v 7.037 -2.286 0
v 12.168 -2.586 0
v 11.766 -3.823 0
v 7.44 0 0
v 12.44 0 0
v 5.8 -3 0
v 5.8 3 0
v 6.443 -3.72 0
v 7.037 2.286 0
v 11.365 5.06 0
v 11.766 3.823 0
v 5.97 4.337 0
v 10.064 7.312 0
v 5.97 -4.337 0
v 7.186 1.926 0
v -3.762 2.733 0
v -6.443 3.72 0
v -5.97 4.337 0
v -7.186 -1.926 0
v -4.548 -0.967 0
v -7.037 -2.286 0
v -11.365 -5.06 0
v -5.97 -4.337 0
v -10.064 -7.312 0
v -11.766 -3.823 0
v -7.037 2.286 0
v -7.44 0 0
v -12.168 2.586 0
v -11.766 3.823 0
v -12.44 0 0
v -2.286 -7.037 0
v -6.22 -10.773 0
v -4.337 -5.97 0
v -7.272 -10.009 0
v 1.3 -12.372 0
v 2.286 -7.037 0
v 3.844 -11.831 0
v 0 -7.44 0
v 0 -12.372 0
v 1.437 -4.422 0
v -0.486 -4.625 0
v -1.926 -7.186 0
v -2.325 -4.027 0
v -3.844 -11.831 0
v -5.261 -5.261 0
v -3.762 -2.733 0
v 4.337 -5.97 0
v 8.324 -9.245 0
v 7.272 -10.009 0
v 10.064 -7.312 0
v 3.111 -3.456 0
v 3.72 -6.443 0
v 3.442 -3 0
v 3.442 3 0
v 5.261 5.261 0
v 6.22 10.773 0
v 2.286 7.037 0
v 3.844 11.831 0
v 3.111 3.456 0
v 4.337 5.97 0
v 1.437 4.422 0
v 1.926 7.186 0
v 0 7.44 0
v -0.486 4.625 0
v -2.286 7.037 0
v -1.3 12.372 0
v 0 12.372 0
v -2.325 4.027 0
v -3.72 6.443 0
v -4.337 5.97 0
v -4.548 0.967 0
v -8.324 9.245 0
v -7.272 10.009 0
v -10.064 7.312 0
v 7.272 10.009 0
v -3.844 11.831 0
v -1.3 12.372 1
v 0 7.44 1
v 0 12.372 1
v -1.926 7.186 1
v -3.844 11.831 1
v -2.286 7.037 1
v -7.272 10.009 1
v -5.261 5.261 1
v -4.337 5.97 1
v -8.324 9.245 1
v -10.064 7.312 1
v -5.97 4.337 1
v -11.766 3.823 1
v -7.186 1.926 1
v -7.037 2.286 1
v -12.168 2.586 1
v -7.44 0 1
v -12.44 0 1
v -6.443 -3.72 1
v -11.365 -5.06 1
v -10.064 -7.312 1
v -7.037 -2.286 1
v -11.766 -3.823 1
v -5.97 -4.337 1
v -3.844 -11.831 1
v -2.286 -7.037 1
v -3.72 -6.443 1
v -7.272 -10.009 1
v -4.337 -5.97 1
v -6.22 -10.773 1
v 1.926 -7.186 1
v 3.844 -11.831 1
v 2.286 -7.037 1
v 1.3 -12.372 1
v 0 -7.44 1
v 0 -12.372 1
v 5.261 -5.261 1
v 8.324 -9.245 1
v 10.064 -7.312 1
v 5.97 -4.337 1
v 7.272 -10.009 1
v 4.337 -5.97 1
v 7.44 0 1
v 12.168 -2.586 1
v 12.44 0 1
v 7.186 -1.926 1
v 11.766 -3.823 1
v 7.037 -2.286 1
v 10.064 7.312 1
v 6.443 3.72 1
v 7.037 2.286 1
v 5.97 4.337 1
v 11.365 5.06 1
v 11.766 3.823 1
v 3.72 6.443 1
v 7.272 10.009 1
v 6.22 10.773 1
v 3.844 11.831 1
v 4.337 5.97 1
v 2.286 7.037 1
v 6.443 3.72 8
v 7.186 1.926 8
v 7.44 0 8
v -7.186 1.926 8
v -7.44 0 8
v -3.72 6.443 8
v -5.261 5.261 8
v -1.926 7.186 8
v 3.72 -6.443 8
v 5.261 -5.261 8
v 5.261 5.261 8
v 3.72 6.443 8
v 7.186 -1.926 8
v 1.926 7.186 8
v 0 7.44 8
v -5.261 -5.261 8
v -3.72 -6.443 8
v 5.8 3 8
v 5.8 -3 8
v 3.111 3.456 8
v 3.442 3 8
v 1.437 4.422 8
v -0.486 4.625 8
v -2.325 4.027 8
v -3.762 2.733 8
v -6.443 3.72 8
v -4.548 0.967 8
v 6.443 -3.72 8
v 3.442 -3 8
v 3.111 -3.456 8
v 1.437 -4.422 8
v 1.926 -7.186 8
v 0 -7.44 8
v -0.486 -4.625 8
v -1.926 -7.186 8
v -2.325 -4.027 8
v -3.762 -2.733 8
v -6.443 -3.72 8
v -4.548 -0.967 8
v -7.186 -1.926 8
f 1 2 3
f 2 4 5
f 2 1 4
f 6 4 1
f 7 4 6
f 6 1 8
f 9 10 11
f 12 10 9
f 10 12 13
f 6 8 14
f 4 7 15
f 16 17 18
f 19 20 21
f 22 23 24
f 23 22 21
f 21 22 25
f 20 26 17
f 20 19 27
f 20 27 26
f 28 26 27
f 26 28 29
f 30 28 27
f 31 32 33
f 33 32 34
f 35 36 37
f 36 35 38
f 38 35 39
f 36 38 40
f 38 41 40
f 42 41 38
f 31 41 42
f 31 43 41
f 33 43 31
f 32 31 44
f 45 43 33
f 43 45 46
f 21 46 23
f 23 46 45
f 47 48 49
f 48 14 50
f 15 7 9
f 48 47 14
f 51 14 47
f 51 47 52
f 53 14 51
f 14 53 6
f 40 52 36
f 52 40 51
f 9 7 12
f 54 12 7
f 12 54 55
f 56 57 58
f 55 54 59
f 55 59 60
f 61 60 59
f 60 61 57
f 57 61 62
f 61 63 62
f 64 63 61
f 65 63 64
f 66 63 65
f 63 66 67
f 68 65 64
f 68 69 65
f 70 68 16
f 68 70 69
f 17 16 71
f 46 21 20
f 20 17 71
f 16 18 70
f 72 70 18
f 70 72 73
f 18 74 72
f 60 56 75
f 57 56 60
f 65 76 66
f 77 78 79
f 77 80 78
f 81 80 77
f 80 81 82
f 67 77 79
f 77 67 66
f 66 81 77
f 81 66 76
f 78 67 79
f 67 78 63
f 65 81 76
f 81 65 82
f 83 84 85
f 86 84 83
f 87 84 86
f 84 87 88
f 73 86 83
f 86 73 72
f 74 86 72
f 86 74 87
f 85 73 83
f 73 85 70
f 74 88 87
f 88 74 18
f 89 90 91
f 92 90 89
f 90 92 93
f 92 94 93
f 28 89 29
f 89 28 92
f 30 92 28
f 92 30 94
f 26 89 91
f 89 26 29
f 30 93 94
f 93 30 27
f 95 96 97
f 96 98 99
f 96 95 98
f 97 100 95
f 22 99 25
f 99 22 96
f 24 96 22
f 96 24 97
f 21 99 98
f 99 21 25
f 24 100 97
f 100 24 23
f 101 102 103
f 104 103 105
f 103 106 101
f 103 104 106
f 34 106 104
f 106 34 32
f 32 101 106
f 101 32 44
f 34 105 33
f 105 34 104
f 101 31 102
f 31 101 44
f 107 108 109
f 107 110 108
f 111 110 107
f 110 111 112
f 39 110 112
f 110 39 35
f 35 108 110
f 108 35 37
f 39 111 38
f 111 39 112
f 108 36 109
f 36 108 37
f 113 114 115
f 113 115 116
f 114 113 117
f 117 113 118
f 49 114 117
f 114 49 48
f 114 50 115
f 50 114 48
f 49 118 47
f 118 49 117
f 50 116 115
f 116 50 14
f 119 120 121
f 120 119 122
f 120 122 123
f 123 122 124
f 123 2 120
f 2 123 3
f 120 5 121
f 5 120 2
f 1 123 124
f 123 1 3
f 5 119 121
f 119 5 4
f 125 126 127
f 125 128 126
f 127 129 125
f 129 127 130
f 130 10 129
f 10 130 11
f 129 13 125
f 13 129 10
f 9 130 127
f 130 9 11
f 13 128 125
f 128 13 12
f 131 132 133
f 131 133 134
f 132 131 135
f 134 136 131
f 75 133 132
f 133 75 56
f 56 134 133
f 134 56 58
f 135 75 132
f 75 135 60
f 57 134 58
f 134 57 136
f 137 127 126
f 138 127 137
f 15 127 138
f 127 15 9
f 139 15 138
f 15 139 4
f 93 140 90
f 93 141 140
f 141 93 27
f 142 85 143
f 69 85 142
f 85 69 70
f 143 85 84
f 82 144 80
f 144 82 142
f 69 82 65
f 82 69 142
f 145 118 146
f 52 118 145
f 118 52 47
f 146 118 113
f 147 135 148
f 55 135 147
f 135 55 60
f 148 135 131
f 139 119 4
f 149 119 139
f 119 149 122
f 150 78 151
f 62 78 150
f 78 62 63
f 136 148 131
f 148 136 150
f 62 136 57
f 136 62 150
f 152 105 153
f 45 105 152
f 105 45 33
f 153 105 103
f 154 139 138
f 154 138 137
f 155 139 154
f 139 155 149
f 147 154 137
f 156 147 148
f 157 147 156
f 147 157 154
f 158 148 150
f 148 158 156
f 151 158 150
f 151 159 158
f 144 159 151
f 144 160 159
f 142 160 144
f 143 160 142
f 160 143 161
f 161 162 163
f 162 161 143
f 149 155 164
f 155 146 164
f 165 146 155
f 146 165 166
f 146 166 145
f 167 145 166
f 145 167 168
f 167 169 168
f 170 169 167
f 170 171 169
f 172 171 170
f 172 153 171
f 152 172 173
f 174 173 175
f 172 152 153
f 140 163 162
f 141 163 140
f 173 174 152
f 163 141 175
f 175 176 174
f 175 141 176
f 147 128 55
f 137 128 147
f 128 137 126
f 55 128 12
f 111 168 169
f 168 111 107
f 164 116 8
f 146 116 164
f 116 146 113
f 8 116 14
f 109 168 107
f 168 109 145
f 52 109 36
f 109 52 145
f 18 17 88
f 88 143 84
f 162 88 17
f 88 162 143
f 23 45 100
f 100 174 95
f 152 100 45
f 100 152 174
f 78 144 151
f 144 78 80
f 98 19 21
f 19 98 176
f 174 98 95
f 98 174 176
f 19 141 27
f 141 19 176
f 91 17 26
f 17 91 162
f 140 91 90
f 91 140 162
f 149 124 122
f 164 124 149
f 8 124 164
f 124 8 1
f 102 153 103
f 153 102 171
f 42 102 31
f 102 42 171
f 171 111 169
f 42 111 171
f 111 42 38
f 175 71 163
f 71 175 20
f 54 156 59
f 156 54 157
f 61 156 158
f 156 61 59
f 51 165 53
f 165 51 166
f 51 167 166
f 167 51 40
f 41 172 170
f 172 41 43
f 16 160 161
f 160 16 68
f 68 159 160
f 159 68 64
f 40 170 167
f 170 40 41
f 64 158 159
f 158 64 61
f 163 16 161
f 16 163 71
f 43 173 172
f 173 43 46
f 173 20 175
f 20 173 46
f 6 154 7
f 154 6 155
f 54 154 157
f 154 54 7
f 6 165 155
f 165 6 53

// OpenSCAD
encoder_wheel_axial_hole_dia = 9.3;
encoder_blades_no = 10;
encoder_wheel_dia = encoder_wheel_axial_hole_dia*1.6 + 10;

encoder_mount_screw_dia = 5;
encoder_wheel();
//encoder_mount();

// this part was designed to fit into particular machine model, probably you need to redesign this
module encoder_mount()
{
    rotate([0,-90,45]) linear_extrude(height=2) polygon([[0,4],[0,28],[13,28]]);
    difference(){
        translate([-22,18,0]) cube([5,4,31]);
        // holes
        translate([-20,22,18]) rotate([90,0,0]) { 
            cylinder(r=1.0, h=20);
            translate([0,11,0]) cylinder(r=1.0, h=20);
        }
    }
    difference(){
        hull(){
            for (i = [1,-1])
            translate([i*2,0,0]) cylinder(r=encoder_mount_screw_dia, h=2);
            translate([-22,16,0]) cube([5,6,2]);
        }
        hull(){
            for (i = [1,-1])
            translate([i*2,0,0]) cylinder(r=encoder_mount_screw_dia/2, h=2);
        }
    }
}

module encoder_wheel(){
    blade_angle = 360 / encoder_blades_no/2;
    
    difference(){
        union(){
            for(i=[0:blade_angle:360])
                rotate([0,0,i*2]) encoder_blade(blade_angle);            
                
            cylinder(r=encoder_wheel_axial_hole_dia*0.8, h = 8);
        }
        cylinder(r=encoder_wheel_axial_hole_dia/2, h = 10);
        translate([encoder_wheel_axial_hole_dia-7.5,-3,0]) cube([4,6,10]);
    }
}

module encoder_blade(angle = 10)
intersection(){
    difference(){
        cylinder(r=encoder_wheel_dia/2, h = 1);
        translate([0,-encoder_wheel_dia,0]) cube([encoder_wheel_dia, encoder_wheel_dia*2, 1]);
    }
    rotate([0,0,angle]) cube([encoder_wheel_dia, encoder_wheel_dia, 1]);
};
